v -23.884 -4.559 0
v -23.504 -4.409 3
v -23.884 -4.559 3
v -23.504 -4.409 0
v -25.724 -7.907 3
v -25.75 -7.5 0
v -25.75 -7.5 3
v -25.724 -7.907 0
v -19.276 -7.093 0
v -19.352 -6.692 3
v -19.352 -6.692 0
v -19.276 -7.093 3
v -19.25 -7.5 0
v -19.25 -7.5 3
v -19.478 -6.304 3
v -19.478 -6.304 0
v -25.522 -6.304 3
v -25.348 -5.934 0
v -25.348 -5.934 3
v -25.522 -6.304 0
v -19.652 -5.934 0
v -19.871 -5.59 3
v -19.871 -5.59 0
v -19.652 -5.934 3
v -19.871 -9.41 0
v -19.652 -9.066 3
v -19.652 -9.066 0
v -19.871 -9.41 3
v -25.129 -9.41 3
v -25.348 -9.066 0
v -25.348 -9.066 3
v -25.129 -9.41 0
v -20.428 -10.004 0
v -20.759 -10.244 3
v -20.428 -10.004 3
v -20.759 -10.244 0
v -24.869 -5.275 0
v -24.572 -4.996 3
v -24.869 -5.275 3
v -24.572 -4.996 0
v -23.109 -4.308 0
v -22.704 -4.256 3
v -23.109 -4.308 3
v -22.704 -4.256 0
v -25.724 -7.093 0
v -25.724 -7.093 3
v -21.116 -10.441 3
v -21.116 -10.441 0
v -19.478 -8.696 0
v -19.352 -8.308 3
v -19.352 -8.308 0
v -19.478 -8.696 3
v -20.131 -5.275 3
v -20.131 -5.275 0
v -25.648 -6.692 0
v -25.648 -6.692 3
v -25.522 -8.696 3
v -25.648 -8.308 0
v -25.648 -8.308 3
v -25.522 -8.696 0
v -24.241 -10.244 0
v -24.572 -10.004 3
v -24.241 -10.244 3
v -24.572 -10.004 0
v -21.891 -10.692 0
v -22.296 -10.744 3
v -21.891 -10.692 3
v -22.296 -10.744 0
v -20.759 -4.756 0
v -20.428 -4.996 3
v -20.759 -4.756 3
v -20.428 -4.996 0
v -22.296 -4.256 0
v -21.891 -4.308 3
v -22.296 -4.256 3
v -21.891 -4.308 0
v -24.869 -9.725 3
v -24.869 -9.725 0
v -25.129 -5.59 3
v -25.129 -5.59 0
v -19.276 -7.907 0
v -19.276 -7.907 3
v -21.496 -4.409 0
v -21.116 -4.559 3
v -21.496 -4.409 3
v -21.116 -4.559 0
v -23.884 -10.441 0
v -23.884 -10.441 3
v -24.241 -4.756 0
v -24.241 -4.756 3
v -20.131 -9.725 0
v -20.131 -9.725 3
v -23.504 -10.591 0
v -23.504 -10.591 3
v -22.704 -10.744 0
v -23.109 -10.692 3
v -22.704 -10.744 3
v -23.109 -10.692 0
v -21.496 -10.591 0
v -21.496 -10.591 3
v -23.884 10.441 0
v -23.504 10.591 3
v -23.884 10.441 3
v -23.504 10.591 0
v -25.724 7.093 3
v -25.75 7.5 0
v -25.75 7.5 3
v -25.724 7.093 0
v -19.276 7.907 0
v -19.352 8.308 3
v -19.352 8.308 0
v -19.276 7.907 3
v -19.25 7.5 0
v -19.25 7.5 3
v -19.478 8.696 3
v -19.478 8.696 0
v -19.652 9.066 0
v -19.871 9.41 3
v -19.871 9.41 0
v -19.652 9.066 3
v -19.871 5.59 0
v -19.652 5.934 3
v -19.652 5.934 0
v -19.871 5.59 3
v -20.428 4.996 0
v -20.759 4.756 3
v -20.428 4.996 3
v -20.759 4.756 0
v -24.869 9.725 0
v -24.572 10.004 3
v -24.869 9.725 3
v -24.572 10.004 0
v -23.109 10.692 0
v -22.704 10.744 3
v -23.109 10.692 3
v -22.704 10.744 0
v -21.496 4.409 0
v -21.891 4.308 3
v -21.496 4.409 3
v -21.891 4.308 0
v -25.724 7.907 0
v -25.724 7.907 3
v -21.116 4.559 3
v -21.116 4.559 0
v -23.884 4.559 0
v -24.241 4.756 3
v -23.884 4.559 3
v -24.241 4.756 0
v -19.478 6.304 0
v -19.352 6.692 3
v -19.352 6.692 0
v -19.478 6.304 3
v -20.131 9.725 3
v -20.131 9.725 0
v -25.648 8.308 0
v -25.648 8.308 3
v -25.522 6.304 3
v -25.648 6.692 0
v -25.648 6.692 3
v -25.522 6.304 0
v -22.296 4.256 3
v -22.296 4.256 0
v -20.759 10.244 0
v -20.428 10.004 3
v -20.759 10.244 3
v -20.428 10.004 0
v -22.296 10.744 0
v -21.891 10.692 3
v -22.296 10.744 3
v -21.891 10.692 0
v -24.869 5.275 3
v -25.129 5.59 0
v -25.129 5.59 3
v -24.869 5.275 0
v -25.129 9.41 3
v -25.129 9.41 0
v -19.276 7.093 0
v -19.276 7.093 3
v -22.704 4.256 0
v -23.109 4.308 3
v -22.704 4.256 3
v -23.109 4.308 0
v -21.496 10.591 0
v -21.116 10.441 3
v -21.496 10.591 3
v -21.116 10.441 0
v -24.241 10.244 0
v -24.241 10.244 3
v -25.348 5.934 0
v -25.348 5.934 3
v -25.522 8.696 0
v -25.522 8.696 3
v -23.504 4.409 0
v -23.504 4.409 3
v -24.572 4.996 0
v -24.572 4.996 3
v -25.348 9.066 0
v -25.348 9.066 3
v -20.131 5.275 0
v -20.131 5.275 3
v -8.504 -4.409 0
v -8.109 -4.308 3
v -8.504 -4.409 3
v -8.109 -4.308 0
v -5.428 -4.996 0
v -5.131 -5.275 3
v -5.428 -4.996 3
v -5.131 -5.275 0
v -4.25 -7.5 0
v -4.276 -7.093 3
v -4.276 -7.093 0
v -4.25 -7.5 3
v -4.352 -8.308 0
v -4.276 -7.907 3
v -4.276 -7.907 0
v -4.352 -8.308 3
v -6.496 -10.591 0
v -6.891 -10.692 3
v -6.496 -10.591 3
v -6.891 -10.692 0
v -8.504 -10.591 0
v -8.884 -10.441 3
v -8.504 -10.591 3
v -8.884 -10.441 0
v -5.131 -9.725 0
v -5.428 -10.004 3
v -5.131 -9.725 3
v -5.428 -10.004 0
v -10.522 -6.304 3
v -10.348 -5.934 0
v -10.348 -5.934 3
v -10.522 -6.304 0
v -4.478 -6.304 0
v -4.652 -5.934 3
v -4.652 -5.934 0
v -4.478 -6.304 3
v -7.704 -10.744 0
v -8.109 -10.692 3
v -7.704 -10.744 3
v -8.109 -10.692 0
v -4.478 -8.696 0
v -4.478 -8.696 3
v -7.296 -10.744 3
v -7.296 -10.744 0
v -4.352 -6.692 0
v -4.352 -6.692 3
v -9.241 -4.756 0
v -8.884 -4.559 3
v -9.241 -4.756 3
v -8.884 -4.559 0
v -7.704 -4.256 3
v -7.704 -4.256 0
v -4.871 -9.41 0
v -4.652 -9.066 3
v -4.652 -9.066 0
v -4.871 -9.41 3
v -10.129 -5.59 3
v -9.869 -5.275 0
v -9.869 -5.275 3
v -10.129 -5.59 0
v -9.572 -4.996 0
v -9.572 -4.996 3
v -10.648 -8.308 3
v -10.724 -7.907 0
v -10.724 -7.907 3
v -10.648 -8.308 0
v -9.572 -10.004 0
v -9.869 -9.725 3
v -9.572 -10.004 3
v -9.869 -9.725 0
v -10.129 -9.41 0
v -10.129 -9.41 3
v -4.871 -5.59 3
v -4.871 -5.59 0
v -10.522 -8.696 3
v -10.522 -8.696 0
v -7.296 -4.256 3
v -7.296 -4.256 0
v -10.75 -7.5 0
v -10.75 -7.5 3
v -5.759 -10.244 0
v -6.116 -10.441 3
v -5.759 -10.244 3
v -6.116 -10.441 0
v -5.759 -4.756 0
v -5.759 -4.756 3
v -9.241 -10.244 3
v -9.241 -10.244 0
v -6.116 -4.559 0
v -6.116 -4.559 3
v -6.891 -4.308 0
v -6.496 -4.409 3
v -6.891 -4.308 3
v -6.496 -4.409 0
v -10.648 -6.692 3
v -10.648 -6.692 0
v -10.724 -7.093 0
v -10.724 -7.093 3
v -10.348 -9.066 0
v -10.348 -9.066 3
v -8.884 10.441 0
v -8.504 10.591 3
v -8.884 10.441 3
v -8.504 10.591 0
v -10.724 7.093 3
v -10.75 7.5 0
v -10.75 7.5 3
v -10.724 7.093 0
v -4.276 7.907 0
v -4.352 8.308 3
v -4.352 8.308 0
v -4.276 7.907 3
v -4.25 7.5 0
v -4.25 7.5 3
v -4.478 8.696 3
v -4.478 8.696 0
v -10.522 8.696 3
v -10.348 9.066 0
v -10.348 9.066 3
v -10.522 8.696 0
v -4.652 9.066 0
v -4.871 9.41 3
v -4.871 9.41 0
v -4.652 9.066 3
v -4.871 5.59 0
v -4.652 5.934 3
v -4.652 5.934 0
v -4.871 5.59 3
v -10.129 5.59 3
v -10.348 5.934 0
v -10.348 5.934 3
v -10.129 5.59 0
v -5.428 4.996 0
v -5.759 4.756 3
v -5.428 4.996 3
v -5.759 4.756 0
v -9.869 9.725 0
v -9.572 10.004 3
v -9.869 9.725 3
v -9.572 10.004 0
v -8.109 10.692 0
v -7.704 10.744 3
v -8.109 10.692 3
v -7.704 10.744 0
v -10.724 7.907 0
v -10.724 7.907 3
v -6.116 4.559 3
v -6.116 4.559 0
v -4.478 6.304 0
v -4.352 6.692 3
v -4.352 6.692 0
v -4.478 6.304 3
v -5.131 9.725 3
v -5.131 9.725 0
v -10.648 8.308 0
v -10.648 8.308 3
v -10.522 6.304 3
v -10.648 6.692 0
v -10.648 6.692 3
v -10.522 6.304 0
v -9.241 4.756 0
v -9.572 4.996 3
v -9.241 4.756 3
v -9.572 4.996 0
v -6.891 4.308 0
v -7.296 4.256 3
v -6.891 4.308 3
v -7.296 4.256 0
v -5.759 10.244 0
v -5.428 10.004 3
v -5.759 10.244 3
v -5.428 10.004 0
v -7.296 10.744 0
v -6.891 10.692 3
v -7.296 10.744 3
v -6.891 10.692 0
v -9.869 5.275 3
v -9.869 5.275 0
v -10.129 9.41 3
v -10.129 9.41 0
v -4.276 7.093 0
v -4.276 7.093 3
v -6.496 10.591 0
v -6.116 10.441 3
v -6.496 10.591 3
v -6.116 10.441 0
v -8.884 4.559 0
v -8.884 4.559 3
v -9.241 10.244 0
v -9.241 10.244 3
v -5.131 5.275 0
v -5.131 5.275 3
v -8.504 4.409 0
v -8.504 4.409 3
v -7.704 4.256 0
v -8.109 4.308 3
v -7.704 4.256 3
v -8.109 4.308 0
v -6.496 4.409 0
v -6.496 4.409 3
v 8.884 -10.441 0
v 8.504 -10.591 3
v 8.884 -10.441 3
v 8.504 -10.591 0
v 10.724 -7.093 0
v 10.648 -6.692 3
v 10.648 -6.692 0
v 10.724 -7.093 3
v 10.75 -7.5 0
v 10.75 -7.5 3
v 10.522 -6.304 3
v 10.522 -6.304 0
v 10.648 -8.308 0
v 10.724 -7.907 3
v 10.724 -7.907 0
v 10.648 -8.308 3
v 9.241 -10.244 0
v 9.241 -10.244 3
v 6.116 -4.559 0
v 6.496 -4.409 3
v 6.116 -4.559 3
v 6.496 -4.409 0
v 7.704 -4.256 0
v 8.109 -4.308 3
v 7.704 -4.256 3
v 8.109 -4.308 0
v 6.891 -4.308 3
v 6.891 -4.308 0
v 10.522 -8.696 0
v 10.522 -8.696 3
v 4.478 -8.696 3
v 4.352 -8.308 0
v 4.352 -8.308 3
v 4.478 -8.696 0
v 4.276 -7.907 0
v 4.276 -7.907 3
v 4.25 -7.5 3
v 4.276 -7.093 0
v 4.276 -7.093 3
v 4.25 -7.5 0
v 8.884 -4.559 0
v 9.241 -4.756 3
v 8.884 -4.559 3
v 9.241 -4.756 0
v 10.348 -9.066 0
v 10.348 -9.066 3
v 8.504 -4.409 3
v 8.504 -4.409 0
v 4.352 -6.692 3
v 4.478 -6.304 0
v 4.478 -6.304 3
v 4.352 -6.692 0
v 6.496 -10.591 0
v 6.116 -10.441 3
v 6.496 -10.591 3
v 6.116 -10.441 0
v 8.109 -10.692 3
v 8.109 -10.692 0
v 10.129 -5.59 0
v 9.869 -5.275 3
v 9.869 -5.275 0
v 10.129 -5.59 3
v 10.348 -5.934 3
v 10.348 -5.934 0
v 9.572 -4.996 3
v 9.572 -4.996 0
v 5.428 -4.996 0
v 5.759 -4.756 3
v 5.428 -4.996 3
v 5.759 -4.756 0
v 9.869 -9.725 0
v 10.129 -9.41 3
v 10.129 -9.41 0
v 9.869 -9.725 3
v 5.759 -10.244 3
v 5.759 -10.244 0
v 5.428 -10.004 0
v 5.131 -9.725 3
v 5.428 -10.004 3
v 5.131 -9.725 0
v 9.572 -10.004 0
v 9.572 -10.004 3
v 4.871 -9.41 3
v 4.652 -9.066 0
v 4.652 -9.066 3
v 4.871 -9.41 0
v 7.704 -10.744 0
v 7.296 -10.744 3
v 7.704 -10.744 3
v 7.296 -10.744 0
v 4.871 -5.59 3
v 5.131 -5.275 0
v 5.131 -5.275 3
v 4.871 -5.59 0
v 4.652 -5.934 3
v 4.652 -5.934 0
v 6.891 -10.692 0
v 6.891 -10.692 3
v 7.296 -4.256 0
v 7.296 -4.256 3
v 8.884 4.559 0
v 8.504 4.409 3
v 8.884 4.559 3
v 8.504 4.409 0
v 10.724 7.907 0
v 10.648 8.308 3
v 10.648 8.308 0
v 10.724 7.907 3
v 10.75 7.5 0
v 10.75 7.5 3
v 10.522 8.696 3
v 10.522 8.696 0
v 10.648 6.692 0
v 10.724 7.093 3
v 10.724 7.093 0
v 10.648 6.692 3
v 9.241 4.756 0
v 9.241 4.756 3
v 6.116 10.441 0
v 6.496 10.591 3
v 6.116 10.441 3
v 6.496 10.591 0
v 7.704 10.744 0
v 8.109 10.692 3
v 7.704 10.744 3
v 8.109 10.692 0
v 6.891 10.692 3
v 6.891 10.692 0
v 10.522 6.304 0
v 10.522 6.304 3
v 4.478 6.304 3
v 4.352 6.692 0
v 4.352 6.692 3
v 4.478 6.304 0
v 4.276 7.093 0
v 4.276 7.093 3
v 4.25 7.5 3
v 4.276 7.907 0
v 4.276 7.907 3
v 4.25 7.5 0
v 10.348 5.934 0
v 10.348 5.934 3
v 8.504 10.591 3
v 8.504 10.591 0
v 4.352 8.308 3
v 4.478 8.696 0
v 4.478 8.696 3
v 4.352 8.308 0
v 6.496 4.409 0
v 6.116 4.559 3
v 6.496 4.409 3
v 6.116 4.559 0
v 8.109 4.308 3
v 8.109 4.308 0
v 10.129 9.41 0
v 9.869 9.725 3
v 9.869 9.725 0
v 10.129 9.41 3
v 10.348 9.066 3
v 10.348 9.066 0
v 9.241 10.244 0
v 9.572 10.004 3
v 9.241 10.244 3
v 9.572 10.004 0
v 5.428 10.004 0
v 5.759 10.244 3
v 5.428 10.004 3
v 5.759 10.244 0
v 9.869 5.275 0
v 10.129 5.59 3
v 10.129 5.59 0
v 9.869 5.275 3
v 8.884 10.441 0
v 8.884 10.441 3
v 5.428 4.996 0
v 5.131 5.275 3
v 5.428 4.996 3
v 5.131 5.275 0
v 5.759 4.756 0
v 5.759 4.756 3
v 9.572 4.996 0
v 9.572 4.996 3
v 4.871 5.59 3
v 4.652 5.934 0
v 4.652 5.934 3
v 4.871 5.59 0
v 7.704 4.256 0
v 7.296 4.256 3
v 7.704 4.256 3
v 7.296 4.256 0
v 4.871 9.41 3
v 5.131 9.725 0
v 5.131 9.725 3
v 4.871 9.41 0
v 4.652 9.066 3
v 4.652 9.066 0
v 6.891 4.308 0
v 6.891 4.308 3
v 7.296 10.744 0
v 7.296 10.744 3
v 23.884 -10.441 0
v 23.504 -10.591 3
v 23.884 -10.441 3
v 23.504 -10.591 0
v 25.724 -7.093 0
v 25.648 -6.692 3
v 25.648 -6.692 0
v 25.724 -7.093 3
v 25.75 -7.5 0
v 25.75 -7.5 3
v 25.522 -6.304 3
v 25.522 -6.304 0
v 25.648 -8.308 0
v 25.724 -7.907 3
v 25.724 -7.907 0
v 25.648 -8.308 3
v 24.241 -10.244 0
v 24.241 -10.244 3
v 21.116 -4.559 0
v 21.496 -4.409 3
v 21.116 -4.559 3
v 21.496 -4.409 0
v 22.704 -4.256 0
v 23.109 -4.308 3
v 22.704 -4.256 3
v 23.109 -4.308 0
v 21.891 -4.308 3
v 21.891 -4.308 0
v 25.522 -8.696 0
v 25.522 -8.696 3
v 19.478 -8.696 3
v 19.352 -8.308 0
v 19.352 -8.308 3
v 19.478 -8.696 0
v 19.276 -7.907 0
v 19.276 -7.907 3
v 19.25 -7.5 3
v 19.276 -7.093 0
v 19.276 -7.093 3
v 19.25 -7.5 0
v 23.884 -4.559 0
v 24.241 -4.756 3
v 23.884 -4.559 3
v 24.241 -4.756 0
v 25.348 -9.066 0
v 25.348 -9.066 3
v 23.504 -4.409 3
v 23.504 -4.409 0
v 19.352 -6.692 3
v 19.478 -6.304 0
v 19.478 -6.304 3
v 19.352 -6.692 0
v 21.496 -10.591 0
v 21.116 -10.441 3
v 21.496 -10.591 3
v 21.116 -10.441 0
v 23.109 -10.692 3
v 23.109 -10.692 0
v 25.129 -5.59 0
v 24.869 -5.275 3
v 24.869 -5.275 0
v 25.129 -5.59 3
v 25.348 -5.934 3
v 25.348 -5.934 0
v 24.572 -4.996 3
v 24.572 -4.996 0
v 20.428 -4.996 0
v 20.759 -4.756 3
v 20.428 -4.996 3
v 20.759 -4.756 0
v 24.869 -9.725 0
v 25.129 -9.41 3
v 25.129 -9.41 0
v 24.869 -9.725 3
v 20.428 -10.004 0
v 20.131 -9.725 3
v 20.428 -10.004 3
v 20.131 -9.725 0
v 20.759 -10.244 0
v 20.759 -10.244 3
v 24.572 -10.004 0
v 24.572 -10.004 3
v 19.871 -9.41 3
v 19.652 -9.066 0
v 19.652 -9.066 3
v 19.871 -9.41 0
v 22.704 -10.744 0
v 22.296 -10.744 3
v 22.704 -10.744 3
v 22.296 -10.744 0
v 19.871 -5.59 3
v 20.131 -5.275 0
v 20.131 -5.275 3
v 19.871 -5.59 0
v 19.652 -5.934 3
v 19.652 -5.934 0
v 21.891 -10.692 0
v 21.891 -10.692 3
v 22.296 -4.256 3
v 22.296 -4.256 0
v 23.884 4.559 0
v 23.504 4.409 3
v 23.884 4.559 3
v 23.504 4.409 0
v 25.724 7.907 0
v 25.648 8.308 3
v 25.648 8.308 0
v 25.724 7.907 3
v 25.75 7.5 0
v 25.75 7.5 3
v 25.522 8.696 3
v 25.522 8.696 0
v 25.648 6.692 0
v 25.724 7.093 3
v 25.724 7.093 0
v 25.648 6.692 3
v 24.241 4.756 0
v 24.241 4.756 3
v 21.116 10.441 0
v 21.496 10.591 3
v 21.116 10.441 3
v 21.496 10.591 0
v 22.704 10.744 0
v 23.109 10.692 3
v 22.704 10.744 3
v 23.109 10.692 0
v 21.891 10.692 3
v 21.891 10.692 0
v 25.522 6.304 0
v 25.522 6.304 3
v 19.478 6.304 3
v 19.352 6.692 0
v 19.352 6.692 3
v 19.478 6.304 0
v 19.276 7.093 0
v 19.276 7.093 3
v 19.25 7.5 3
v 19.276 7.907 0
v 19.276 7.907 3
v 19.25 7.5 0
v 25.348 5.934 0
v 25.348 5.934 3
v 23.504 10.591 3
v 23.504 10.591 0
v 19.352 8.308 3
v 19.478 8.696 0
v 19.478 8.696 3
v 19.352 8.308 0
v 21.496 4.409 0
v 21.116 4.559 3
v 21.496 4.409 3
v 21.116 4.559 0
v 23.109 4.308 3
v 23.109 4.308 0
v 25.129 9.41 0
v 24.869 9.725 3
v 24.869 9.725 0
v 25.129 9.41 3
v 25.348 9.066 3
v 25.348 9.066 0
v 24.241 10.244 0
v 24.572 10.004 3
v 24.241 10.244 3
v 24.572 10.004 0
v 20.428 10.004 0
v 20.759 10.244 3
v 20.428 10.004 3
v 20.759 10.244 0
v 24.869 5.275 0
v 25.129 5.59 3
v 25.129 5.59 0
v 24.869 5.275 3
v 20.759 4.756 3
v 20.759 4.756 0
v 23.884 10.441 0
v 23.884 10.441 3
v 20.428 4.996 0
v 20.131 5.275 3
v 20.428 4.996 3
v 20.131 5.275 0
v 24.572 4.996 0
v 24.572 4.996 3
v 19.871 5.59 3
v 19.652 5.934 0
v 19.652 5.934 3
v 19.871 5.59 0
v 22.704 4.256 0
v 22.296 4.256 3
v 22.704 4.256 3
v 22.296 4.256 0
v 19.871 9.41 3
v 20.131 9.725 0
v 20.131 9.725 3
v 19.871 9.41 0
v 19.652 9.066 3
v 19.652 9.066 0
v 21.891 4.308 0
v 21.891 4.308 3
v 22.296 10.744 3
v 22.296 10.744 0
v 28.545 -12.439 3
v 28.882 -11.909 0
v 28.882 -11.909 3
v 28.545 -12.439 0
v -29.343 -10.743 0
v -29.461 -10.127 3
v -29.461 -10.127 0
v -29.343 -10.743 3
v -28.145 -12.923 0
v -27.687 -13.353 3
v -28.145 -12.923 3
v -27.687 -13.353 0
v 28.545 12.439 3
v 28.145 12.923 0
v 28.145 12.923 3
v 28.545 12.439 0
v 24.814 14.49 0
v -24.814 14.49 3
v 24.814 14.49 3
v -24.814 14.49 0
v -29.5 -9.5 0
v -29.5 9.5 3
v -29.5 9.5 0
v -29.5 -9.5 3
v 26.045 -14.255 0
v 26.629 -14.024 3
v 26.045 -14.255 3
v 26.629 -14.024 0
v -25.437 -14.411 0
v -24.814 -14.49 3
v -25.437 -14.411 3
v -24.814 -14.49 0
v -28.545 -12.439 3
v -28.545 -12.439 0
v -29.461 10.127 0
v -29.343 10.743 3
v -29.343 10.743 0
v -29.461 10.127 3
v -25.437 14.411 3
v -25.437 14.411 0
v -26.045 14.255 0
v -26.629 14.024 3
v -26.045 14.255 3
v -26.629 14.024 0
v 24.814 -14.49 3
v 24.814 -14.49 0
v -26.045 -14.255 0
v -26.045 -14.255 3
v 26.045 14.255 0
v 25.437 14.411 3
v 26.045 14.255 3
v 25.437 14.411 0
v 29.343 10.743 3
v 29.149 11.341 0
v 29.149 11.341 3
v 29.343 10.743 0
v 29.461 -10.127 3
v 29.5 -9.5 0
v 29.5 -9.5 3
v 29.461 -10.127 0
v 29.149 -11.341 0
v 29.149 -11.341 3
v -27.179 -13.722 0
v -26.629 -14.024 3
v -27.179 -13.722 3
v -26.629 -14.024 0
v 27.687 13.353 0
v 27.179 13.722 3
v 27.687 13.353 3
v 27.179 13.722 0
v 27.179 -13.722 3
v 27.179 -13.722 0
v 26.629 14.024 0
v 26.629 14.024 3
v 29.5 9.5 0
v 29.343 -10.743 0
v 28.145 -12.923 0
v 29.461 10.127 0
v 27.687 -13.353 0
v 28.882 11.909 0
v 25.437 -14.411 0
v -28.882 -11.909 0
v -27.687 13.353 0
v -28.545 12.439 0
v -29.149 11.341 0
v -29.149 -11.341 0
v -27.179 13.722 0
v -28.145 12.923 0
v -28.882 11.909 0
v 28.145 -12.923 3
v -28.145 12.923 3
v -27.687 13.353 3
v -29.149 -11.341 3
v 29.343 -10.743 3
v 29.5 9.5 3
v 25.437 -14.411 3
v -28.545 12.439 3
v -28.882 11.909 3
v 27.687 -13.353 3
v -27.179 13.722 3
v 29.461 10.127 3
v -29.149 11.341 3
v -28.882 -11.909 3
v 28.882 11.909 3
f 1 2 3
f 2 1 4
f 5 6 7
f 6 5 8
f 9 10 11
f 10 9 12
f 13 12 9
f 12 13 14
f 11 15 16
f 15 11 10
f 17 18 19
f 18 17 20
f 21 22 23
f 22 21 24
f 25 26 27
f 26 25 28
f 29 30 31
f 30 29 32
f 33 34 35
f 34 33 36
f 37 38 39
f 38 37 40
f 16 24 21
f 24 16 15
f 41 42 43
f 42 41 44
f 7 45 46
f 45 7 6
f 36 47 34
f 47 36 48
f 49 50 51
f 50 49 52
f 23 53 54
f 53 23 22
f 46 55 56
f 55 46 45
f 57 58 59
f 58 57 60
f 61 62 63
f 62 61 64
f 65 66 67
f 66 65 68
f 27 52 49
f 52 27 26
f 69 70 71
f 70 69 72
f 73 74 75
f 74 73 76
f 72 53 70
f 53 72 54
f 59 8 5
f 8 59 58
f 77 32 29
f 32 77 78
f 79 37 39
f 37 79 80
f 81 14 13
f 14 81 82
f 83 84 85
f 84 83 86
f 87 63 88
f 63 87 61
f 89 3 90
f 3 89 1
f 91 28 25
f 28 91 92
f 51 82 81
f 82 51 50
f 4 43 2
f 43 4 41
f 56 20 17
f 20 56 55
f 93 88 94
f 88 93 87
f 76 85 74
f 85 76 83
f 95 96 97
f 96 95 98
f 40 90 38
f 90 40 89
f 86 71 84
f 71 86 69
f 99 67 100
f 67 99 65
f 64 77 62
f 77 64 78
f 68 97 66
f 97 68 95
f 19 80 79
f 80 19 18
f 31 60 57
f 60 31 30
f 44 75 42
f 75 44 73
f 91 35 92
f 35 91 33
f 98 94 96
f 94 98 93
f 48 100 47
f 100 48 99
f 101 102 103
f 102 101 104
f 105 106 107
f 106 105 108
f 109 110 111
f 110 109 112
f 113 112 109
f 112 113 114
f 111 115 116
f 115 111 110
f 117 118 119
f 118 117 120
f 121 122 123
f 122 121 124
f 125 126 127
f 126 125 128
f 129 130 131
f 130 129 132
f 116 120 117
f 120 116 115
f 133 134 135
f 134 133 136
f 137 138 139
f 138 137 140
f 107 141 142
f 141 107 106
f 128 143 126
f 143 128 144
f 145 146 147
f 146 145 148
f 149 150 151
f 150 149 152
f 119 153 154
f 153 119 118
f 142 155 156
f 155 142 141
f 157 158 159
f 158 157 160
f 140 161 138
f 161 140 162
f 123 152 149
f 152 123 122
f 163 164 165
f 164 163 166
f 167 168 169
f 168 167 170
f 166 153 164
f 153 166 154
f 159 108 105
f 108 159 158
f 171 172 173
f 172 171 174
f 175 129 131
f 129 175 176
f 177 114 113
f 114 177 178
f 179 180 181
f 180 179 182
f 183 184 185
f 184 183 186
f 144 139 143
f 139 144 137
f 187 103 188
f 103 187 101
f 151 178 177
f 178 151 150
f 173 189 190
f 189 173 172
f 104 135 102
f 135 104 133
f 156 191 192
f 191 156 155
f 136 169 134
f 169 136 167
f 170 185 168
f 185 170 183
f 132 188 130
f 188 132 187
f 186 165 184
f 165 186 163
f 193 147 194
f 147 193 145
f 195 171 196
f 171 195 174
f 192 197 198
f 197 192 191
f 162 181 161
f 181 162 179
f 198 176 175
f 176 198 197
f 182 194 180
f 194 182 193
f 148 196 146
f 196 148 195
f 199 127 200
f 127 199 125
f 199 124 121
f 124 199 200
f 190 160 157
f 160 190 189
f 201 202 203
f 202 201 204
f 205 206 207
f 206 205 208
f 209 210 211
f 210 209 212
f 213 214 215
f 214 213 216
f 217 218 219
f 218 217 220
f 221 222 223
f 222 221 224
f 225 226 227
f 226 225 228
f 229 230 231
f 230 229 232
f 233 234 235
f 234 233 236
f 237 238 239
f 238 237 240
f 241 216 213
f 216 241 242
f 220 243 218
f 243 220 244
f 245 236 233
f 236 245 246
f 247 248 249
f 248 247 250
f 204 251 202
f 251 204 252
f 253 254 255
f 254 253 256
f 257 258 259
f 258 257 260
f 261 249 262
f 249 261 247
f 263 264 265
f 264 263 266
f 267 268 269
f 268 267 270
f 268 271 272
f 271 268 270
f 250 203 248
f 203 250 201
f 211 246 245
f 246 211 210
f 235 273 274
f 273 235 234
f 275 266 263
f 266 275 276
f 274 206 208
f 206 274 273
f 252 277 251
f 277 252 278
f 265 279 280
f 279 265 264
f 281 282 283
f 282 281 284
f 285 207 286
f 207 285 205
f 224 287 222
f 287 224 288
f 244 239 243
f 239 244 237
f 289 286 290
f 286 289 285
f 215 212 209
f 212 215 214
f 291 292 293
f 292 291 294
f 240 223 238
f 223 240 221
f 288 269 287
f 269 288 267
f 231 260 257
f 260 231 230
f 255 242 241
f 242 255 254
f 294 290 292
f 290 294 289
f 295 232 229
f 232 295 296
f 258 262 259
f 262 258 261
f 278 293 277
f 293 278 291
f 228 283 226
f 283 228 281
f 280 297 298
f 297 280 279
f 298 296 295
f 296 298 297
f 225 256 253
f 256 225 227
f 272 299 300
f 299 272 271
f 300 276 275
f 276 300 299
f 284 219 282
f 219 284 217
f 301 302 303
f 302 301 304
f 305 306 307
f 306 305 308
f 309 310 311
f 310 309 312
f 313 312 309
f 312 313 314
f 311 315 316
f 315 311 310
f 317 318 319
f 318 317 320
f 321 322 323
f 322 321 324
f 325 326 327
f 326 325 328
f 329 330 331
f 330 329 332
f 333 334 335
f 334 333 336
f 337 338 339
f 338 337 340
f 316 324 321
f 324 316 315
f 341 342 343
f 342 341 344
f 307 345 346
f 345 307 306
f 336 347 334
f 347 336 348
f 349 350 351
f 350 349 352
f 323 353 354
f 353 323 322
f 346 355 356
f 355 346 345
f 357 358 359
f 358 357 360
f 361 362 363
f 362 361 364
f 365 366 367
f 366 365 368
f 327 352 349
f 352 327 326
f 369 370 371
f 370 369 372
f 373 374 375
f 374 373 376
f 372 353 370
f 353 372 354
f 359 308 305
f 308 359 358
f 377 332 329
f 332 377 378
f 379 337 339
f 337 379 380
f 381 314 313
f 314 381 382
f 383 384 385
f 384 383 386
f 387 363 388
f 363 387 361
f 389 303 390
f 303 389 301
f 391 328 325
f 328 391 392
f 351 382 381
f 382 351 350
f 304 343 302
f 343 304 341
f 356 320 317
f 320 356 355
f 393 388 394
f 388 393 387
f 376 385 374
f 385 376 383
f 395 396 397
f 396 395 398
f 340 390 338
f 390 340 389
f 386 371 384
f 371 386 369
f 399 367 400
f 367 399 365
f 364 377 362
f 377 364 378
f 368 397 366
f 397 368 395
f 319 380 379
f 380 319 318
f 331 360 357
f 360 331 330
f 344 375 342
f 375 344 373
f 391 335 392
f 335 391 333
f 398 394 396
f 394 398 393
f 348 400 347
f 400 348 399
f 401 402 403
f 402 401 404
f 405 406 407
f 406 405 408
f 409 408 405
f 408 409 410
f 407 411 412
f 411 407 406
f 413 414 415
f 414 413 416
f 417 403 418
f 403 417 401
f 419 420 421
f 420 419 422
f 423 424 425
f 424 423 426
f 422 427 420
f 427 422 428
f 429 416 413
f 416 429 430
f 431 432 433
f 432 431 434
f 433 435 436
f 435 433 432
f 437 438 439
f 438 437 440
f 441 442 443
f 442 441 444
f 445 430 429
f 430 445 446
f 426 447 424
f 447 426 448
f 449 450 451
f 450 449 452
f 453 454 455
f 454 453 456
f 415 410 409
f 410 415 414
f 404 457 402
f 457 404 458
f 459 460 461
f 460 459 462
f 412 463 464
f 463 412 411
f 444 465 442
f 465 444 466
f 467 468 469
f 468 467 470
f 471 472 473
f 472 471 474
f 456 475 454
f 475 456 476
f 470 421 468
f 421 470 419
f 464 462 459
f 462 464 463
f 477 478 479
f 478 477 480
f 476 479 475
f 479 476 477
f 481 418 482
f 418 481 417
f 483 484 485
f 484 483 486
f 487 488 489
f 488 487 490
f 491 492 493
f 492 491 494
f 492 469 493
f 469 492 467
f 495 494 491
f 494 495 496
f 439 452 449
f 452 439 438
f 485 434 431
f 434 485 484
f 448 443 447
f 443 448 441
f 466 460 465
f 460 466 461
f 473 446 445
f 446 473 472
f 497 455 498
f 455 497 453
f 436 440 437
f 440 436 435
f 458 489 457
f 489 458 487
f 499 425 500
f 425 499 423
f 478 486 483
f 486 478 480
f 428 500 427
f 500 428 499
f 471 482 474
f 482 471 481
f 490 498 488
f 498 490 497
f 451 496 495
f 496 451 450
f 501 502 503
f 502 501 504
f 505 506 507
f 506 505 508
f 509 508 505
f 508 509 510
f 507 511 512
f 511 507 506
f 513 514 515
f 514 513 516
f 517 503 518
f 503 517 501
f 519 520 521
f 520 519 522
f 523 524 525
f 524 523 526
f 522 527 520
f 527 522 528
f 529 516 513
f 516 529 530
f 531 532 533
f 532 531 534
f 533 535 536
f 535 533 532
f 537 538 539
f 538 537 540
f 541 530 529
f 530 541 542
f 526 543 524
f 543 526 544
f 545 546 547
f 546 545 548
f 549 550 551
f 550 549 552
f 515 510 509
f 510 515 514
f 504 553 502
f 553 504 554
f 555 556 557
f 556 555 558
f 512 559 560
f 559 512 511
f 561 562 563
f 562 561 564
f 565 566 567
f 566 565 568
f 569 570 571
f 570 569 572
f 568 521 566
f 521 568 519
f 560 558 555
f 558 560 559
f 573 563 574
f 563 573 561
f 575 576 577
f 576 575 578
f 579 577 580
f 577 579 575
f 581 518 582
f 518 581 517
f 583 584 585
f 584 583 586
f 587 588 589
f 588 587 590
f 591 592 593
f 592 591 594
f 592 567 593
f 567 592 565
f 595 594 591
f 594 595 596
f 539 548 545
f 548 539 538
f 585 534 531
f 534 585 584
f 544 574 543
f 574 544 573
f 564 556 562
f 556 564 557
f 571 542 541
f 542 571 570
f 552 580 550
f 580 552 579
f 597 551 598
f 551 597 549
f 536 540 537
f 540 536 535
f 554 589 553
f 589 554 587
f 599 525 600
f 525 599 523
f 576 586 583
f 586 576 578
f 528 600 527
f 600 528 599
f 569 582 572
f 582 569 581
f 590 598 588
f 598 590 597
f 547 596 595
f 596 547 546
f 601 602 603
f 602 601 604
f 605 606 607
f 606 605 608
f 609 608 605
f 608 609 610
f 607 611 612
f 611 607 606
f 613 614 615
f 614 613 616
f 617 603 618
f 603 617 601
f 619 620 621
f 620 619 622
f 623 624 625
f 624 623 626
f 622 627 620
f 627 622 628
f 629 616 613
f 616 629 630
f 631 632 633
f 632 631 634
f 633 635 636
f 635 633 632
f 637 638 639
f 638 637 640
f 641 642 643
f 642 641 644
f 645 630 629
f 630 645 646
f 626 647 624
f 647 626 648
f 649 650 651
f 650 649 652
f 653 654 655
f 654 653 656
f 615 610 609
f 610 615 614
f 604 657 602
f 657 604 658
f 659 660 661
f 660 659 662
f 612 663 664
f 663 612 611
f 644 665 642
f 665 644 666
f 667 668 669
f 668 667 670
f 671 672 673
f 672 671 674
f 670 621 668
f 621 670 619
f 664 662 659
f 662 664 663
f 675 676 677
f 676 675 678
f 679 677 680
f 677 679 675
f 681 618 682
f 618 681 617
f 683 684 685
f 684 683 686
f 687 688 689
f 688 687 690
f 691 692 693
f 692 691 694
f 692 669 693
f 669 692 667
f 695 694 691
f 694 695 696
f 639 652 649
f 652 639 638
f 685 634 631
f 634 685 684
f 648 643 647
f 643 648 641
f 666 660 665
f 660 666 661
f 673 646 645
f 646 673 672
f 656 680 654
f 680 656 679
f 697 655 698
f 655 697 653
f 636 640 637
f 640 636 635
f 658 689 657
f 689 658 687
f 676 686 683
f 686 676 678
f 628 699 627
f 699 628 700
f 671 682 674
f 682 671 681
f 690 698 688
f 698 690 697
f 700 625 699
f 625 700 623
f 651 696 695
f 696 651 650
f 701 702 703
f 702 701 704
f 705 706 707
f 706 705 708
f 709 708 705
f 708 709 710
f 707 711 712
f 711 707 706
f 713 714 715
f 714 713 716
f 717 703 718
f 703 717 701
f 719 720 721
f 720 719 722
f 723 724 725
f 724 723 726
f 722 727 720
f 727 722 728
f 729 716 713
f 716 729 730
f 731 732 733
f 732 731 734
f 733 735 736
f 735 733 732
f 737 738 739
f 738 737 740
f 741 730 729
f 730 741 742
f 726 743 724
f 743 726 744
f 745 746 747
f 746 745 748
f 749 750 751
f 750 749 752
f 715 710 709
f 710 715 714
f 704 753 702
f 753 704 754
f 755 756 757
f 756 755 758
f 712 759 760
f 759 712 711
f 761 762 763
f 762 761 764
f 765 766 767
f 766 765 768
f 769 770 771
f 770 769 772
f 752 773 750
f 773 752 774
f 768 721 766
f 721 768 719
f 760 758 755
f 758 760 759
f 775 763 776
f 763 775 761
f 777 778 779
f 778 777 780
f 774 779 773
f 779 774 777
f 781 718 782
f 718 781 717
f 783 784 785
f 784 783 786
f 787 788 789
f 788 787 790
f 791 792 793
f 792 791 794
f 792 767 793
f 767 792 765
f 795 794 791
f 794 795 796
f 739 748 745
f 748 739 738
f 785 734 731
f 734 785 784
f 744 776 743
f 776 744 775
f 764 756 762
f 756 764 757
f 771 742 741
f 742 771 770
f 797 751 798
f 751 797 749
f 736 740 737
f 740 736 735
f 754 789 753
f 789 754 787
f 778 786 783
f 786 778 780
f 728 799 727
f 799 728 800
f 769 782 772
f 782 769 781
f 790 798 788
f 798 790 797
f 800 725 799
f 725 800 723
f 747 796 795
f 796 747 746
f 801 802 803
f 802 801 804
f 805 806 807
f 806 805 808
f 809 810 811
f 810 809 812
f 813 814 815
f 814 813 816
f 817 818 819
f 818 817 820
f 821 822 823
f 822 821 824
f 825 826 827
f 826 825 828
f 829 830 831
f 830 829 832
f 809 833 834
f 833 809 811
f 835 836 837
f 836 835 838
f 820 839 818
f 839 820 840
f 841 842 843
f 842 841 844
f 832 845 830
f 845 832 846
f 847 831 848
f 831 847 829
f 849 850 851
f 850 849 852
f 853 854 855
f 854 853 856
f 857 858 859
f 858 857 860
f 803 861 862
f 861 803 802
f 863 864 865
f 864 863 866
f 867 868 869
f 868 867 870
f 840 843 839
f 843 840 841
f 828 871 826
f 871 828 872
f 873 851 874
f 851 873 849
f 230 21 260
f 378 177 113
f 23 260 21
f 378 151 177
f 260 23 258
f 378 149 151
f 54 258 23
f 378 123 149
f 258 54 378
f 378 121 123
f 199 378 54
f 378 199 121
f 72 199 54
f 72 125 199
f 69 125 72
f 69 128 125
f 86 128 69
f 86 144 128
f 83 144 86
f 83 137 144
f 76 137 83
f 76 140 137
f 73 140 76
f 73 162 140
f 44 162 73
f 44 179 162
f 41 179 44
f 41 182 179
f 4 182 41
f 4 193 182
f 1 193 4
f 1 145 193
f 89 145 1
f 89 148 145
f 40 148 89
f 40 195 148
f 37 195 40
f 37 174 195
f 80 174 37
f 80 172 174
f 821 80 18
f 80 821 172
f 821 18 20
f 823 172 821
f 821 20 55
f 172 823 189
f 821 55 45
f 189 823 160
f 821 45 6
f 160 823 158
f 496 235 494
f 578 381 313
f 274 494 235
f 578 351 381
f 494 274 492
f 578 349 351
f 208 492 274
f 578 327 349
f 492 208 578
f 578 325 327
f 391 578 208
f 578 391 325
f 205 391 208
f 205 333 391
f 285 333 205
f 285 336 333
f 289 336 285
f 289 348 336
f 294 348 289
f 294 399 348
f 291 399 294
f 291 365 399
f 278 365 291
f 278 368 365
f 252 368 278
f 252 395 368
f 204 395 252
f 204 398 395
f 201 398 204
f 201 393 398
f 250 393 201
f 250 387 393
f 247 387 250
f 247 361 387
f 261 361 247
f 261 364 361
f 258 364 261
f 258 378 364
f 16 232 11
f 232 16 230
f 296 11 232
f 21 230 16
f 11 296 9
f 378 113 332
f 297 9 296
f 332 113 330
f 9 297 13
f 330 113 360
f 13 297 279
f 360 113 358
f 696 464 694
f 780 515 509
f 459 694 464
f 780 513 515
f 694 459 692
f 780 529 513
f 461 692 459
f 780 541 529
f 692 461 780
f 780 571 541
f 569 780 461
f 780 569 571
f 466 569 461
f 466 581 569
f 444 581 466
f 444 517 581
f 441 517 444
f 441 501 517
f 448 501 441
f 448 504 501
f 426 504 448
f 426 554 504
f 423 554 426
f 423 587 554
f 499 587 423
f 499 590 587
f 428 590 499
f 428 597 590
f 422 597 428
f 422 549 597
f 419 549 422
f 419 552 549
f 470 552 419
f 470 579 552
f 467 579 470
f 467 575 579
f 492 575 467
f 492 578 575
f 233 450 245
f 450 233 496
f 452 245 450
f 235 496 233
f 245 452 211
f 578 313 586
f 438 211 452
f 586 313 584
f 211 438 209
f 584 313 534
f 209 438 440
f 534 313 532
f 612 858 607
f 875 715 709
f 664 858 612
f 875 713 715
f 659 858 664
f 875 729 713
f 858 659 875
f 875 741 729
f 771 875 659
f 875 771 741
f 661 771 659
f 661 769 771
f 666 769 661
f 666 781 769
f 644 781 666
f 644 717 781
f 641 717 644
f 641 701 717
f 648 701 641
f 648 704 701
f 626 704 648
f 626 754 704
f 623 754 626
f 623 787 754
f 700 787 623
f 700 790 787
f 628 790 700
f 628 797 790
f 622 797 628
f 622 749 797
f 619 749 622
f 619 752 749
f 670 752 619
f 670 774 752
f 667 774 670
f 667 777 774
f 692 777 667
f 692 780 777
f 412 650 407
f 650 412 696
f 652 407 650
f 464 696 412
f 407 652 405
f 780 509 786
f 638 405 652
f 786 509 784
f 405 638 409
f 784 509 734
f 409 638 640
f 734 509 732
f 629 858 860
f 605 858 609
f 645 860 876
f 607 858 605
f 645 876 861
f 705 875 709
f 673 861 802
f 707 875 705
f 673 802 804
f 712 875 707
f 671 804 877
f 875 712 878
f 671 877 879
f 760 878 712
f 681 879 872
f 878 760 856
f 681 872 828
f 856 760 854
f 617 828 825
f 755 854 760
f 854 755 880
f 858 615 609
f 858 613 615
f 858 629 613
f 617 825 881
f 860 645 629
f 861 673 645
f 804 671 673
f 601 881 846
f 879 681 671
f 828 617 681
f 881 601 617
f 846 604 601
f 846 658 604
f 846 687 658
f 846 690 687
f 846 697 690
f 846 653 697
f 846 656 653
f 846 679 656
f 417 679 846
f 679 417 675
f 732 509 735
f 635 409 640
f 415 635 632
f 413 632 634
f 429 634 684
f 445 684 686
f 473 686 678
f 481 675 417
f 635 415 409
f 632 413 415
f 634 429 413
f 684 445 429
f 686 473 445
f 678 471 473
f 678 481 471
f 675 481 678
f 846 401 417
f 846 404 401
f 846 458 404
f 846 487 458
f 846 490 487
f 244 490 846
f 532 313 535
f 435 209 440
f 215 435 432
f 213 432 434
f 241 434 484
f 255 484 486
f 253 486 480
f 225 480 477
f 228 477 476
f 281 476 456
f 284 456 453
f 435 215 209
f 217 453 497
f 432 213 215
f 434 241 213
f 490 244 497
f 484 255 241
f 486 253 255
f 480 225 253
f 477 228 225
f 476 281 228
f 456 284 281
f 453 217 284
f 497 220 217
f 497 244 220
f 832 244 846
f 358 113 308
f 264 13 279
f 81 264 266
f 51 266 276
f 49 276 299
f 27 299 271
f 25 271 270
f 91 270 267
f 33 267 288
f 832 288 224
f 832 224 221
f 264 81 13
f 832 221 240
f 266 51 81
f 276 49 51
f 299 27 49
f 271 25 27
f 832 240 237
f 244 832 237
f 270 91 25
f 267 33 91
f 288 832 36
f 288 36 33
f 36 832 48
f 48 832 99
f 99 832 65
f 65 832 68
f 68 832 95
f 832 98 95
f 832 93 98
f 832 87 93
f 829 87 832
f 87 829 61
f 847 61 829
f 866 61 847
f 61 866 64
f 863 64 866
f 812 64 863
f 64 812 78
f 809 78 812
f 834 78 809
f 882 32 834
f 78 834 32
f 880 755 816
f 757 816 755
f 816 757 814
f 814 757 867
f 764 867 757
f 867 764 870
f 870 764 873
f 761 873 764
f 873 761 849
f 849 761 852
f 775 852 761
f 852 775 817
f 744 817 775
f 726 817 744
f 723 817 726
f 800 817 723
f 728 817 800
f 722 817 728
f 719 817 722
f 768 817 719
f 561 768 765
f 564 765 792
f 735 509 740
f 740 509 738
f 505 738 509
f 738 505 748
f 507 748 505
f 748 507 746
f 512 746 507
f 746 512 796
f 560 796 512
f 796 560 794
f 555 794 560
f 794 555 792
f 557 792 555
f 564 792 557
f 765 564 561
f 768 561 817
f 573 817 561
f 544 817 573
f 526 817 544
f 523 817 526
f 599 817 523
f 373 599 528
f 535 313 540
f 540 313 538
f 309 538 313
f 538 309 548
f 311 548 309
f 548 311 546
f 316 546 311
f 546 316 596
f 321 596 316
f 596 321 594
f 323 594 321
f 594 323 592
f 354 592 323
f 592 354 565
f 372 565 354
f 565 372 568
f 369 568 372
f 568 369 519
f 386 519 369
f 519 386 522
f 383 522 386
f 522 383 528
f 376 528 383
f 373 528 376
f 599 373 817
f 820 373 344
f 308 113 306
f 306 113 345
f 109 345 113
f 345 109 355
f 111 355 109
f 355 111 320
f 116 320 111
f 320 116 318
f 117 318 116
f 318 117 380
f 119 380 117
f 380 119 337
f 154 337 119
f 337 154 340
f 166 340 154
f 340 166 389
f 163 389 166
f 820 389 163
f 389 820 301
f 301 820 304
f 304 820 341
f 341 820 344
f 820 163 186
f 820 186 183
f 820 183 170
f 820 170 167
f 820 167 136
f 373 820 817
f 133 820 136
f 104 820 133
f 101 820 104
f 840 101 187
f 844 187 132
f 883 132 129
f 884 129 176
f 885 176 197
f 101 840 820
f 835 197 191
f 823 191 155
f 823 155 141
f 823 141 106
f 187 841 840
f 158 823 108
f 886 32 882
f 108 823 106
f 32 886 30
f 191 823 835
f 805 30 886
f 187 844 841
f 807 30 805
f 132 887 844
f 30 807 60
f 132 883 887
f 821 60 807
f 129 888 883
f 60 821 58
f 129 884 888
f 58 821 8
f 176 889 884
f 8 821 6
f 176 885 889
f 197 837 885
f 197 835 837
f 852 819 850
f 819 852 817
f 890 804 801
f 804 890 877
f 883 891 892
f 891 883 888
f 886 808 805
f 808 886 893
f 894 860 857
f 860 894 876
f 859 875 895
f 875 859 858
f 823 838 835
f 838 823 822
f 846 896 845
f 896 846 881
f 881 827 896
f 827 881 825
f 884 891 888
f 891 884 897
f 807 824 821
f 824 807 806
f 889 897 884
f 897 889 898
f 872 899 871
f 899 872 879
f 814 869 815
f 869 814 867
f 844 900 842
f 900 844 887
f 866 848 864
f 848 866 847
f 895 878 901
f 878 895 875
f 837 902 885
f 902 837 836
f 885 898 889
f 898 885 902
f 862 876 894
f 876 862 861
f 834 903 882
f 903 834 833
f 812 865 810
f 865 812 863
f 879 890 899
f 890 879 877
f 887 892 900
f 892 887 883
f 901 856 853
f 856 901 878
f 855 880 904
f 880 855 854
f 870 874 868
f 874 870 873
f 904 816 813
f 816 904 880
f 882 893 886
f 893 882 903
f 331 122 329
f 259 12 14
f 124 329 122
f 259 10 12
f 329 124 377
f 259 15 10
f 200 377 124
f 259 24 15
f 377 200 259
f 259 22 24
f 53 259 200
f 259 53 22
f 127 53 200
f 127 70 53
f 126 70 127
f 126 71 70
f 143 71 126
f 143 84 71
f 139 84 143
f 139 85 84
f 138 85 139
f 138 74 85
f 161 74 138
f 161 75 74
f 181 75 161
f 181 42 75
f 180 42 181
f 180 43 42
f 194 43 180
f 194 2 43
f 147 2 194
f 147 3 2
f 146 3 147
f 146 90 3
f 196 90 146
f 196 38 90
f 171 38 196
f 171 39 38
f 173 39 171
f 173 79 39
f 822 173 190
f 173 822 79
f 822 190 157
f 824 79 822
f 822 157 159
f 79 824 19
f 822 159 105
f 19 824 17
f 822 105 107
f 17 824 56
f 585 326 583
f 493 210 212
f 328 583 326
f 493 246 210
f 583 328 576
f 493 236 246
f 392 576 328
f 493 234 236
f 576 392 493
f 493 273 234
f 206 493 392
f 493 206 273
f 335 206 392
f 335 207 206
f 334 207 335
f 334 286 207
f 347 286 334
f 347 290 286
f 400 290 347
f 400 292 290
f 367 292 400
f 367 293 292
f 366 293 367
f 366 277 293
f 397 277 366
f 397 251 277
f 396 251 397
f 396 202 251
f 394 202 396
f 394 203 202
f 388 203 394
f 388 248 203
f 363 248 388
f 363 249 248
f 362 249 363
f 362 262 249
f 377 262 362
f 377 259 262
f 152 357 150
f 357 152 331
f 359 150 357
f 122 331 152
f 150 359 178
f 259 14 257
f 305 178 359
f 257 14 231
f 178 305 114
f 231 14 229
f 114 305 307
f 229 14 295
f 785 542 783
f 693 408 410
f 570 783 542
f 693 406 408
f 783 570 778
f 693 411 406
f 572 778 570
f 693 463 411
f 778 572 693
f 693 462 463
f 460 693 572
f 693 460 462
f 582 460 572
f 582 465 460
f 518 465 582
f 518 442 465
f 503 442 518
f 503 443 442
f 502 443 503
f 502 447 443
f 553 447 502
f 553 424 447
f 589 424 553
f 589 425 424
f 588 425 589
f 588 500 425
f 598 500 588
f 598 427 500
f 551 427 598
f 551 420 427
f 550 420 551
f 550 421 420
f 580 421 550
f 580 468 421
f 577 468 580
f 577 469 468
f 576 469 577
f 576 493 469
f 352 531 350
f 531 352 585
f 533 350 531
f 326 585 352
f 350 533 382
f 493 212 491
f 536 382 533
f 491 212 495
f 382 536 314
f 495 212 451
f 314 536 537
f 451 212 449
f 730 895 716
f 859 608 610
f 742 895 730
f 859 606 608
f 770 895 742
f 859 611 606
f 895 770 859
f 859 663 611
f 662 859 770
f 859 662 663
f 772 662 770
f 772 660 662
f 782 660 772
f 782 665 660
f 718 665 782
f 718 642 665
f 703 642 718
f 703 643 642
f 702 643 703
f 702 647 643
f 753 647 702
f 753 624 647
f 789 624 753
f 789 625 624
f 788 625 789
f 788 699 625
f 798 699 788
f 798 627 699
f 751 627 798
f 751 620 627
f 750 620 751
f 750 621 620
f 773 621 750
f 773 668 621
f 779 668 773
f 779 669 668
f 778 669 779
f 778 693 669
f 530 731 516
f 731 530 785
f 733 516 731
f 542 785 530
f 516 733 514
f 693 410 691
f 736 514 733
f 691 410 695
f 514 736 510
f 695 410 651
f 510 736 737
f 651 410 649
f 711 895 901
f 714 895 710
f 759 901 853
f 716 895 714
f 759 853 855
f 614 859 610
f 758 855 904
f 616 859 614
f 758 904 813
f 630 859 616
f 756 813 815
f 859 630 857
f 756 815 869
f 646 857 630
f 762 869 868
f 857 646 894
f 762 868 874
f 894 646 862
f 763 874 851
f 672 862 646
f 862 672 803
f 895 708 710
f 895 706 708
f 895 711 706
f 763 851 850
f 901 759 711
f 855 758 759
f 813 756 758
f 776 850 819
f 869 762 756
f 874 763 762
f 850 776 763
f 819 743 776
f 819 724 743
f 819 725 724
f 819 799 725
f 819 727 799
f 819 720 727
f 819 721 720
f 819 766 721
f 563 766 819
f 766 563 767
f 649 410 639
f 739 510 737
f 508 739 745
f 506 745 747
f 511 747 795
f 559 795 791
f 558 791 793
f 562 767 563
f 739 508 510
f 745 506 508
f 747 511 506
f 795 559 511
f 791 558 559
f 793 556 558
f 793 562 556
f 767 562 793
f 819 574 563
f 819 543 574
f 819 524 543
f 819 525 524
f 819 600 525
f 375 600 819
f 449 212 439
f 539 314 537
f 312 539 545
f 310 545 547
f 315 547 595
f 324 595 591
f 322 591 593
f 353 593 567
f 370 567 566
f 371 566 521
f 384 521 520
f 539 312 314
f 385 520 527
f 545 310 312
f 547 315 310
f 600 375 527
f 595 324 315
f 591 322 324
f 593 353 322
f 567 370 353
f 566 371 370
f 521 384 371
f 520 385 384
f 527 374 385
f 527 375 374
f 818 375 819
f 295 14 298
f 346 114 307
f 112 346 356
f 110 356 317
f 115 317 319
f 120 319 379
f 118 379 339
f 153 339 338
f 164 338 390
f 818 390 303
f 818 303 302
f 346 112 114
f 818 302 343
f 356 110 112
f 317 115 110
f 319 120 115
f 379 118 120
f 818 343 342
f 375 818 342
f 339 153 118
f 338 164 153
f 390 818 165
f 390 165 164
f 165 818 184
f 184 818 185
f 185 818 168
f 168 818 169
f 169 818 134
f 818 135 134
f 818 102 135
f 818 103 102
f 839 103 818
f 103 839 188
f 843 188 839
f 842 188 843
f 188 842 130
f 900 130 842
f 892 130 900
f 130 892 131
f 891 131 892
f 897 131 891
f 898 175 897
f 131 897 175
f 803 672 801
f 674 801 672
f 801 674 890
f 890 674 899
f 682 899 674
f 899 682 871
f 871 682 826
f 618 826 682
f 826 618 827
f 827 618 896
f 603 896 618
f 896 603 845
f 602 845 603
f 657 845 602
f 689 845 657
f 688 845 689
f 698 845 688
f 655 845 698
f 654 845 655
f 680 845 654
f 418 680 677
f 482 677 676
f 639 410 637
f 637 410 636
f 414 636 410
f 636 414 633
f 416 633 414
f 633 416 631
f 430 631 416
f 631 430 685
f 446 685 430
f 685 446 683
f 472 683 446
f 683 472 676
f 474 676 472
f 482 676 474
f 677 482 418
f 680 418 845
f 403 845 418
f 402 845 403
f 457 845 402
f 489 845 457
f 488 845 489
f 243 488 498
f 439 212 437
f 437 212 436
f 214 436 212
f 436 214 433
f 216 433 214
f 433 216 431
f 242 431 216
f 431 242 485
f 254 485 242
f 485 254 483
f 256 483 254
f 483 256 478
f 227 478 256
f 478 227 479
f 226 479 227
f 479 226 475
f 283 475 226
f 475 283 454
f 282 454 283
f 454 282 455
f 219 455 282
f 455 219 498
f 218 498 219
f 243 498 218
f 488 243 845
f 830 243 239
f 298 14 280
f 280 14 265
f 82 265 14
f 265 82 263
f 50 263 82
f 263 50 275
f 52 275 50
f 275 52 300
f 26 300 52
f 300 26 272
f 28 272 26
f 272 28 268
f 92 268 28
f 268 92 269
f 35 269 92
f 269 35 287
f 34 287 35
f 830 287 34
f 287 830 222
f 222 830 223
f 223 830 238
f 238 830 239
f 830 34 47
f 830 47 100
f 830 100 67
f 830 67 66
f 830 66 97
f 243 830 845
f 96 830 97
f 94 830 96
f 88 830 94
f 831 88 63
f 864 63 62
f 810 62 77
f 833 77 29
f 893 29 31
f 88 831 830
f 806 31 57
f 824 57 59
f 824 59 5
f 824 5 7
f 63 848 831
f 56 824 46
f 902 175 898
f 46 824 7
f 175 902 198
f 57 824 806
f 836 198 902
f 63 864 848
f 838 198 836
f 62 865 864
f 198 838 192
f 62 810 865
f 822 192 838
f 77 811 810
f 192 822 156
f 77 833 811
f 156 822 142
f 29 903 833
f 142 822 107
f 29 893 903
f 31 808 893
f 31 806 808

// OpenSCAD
$fn = 50;


difference() {
	union() {
		hull() {
			translate(v = [-24.5000000000, 9.5000000000, 0]) {
				cylinder(h = 3, r = 5);
			}
			translate(v = [24.5000000000, 9.5000000000, 0]) {
				cylinder(h = 3, r = 5);
			}
			translate(v = [-24.5000000000, -9.5000000000, 0]) {
				cylinder(h = 3, r = 5);
			}
			translate(v = [24.5000000000, -9.5000000000, 0]) {
				cylinder(h = 3, r = 5);
			}
		}
	}
	union() {
		translate(v = [-22.5000000000, -7.5000000000, -100.0000000000]) {
			cylinder(h = 200, r = 3.2500000000);
		}
		translate(v = [-22.5000000000, 7.5000000000, -100.0000000000]) {
			cylinder(h = 200, r = 3.2500000000);
		}
		translate(v = [-7.5000000000, -7.5000000000, -100.0000000000]) {
			cylinder(h = 200, r = 3.2500000000);
		}
		translate(v = [-7.5000000000, 7.5000000000, -100.0000000000]) {
			cylinder(h = 200, r = 3.2500000000);
		}
		translate(v = [7.5000000000, -7.5000000000, -100.0000000000]) {
			cylinder(h = 200, r = 3.2500000000);
		}
		translate(v = [7.5000000000, 7.5000000000, -100.0000000000]) {
			cylinder(h = 200, r = 3.2500000000);
		}
		translate(v = [22.5000000000, -7.5000000000, -100.0000000000]) {
			cylinder(h = 200, r = 3.2500000000);
		}
		translate(v = [22.5000000000, 7.5000000000, -100.0000000000]) {
			cylinder(h = 200, r = 3.2500000000);
		}
	}
}
